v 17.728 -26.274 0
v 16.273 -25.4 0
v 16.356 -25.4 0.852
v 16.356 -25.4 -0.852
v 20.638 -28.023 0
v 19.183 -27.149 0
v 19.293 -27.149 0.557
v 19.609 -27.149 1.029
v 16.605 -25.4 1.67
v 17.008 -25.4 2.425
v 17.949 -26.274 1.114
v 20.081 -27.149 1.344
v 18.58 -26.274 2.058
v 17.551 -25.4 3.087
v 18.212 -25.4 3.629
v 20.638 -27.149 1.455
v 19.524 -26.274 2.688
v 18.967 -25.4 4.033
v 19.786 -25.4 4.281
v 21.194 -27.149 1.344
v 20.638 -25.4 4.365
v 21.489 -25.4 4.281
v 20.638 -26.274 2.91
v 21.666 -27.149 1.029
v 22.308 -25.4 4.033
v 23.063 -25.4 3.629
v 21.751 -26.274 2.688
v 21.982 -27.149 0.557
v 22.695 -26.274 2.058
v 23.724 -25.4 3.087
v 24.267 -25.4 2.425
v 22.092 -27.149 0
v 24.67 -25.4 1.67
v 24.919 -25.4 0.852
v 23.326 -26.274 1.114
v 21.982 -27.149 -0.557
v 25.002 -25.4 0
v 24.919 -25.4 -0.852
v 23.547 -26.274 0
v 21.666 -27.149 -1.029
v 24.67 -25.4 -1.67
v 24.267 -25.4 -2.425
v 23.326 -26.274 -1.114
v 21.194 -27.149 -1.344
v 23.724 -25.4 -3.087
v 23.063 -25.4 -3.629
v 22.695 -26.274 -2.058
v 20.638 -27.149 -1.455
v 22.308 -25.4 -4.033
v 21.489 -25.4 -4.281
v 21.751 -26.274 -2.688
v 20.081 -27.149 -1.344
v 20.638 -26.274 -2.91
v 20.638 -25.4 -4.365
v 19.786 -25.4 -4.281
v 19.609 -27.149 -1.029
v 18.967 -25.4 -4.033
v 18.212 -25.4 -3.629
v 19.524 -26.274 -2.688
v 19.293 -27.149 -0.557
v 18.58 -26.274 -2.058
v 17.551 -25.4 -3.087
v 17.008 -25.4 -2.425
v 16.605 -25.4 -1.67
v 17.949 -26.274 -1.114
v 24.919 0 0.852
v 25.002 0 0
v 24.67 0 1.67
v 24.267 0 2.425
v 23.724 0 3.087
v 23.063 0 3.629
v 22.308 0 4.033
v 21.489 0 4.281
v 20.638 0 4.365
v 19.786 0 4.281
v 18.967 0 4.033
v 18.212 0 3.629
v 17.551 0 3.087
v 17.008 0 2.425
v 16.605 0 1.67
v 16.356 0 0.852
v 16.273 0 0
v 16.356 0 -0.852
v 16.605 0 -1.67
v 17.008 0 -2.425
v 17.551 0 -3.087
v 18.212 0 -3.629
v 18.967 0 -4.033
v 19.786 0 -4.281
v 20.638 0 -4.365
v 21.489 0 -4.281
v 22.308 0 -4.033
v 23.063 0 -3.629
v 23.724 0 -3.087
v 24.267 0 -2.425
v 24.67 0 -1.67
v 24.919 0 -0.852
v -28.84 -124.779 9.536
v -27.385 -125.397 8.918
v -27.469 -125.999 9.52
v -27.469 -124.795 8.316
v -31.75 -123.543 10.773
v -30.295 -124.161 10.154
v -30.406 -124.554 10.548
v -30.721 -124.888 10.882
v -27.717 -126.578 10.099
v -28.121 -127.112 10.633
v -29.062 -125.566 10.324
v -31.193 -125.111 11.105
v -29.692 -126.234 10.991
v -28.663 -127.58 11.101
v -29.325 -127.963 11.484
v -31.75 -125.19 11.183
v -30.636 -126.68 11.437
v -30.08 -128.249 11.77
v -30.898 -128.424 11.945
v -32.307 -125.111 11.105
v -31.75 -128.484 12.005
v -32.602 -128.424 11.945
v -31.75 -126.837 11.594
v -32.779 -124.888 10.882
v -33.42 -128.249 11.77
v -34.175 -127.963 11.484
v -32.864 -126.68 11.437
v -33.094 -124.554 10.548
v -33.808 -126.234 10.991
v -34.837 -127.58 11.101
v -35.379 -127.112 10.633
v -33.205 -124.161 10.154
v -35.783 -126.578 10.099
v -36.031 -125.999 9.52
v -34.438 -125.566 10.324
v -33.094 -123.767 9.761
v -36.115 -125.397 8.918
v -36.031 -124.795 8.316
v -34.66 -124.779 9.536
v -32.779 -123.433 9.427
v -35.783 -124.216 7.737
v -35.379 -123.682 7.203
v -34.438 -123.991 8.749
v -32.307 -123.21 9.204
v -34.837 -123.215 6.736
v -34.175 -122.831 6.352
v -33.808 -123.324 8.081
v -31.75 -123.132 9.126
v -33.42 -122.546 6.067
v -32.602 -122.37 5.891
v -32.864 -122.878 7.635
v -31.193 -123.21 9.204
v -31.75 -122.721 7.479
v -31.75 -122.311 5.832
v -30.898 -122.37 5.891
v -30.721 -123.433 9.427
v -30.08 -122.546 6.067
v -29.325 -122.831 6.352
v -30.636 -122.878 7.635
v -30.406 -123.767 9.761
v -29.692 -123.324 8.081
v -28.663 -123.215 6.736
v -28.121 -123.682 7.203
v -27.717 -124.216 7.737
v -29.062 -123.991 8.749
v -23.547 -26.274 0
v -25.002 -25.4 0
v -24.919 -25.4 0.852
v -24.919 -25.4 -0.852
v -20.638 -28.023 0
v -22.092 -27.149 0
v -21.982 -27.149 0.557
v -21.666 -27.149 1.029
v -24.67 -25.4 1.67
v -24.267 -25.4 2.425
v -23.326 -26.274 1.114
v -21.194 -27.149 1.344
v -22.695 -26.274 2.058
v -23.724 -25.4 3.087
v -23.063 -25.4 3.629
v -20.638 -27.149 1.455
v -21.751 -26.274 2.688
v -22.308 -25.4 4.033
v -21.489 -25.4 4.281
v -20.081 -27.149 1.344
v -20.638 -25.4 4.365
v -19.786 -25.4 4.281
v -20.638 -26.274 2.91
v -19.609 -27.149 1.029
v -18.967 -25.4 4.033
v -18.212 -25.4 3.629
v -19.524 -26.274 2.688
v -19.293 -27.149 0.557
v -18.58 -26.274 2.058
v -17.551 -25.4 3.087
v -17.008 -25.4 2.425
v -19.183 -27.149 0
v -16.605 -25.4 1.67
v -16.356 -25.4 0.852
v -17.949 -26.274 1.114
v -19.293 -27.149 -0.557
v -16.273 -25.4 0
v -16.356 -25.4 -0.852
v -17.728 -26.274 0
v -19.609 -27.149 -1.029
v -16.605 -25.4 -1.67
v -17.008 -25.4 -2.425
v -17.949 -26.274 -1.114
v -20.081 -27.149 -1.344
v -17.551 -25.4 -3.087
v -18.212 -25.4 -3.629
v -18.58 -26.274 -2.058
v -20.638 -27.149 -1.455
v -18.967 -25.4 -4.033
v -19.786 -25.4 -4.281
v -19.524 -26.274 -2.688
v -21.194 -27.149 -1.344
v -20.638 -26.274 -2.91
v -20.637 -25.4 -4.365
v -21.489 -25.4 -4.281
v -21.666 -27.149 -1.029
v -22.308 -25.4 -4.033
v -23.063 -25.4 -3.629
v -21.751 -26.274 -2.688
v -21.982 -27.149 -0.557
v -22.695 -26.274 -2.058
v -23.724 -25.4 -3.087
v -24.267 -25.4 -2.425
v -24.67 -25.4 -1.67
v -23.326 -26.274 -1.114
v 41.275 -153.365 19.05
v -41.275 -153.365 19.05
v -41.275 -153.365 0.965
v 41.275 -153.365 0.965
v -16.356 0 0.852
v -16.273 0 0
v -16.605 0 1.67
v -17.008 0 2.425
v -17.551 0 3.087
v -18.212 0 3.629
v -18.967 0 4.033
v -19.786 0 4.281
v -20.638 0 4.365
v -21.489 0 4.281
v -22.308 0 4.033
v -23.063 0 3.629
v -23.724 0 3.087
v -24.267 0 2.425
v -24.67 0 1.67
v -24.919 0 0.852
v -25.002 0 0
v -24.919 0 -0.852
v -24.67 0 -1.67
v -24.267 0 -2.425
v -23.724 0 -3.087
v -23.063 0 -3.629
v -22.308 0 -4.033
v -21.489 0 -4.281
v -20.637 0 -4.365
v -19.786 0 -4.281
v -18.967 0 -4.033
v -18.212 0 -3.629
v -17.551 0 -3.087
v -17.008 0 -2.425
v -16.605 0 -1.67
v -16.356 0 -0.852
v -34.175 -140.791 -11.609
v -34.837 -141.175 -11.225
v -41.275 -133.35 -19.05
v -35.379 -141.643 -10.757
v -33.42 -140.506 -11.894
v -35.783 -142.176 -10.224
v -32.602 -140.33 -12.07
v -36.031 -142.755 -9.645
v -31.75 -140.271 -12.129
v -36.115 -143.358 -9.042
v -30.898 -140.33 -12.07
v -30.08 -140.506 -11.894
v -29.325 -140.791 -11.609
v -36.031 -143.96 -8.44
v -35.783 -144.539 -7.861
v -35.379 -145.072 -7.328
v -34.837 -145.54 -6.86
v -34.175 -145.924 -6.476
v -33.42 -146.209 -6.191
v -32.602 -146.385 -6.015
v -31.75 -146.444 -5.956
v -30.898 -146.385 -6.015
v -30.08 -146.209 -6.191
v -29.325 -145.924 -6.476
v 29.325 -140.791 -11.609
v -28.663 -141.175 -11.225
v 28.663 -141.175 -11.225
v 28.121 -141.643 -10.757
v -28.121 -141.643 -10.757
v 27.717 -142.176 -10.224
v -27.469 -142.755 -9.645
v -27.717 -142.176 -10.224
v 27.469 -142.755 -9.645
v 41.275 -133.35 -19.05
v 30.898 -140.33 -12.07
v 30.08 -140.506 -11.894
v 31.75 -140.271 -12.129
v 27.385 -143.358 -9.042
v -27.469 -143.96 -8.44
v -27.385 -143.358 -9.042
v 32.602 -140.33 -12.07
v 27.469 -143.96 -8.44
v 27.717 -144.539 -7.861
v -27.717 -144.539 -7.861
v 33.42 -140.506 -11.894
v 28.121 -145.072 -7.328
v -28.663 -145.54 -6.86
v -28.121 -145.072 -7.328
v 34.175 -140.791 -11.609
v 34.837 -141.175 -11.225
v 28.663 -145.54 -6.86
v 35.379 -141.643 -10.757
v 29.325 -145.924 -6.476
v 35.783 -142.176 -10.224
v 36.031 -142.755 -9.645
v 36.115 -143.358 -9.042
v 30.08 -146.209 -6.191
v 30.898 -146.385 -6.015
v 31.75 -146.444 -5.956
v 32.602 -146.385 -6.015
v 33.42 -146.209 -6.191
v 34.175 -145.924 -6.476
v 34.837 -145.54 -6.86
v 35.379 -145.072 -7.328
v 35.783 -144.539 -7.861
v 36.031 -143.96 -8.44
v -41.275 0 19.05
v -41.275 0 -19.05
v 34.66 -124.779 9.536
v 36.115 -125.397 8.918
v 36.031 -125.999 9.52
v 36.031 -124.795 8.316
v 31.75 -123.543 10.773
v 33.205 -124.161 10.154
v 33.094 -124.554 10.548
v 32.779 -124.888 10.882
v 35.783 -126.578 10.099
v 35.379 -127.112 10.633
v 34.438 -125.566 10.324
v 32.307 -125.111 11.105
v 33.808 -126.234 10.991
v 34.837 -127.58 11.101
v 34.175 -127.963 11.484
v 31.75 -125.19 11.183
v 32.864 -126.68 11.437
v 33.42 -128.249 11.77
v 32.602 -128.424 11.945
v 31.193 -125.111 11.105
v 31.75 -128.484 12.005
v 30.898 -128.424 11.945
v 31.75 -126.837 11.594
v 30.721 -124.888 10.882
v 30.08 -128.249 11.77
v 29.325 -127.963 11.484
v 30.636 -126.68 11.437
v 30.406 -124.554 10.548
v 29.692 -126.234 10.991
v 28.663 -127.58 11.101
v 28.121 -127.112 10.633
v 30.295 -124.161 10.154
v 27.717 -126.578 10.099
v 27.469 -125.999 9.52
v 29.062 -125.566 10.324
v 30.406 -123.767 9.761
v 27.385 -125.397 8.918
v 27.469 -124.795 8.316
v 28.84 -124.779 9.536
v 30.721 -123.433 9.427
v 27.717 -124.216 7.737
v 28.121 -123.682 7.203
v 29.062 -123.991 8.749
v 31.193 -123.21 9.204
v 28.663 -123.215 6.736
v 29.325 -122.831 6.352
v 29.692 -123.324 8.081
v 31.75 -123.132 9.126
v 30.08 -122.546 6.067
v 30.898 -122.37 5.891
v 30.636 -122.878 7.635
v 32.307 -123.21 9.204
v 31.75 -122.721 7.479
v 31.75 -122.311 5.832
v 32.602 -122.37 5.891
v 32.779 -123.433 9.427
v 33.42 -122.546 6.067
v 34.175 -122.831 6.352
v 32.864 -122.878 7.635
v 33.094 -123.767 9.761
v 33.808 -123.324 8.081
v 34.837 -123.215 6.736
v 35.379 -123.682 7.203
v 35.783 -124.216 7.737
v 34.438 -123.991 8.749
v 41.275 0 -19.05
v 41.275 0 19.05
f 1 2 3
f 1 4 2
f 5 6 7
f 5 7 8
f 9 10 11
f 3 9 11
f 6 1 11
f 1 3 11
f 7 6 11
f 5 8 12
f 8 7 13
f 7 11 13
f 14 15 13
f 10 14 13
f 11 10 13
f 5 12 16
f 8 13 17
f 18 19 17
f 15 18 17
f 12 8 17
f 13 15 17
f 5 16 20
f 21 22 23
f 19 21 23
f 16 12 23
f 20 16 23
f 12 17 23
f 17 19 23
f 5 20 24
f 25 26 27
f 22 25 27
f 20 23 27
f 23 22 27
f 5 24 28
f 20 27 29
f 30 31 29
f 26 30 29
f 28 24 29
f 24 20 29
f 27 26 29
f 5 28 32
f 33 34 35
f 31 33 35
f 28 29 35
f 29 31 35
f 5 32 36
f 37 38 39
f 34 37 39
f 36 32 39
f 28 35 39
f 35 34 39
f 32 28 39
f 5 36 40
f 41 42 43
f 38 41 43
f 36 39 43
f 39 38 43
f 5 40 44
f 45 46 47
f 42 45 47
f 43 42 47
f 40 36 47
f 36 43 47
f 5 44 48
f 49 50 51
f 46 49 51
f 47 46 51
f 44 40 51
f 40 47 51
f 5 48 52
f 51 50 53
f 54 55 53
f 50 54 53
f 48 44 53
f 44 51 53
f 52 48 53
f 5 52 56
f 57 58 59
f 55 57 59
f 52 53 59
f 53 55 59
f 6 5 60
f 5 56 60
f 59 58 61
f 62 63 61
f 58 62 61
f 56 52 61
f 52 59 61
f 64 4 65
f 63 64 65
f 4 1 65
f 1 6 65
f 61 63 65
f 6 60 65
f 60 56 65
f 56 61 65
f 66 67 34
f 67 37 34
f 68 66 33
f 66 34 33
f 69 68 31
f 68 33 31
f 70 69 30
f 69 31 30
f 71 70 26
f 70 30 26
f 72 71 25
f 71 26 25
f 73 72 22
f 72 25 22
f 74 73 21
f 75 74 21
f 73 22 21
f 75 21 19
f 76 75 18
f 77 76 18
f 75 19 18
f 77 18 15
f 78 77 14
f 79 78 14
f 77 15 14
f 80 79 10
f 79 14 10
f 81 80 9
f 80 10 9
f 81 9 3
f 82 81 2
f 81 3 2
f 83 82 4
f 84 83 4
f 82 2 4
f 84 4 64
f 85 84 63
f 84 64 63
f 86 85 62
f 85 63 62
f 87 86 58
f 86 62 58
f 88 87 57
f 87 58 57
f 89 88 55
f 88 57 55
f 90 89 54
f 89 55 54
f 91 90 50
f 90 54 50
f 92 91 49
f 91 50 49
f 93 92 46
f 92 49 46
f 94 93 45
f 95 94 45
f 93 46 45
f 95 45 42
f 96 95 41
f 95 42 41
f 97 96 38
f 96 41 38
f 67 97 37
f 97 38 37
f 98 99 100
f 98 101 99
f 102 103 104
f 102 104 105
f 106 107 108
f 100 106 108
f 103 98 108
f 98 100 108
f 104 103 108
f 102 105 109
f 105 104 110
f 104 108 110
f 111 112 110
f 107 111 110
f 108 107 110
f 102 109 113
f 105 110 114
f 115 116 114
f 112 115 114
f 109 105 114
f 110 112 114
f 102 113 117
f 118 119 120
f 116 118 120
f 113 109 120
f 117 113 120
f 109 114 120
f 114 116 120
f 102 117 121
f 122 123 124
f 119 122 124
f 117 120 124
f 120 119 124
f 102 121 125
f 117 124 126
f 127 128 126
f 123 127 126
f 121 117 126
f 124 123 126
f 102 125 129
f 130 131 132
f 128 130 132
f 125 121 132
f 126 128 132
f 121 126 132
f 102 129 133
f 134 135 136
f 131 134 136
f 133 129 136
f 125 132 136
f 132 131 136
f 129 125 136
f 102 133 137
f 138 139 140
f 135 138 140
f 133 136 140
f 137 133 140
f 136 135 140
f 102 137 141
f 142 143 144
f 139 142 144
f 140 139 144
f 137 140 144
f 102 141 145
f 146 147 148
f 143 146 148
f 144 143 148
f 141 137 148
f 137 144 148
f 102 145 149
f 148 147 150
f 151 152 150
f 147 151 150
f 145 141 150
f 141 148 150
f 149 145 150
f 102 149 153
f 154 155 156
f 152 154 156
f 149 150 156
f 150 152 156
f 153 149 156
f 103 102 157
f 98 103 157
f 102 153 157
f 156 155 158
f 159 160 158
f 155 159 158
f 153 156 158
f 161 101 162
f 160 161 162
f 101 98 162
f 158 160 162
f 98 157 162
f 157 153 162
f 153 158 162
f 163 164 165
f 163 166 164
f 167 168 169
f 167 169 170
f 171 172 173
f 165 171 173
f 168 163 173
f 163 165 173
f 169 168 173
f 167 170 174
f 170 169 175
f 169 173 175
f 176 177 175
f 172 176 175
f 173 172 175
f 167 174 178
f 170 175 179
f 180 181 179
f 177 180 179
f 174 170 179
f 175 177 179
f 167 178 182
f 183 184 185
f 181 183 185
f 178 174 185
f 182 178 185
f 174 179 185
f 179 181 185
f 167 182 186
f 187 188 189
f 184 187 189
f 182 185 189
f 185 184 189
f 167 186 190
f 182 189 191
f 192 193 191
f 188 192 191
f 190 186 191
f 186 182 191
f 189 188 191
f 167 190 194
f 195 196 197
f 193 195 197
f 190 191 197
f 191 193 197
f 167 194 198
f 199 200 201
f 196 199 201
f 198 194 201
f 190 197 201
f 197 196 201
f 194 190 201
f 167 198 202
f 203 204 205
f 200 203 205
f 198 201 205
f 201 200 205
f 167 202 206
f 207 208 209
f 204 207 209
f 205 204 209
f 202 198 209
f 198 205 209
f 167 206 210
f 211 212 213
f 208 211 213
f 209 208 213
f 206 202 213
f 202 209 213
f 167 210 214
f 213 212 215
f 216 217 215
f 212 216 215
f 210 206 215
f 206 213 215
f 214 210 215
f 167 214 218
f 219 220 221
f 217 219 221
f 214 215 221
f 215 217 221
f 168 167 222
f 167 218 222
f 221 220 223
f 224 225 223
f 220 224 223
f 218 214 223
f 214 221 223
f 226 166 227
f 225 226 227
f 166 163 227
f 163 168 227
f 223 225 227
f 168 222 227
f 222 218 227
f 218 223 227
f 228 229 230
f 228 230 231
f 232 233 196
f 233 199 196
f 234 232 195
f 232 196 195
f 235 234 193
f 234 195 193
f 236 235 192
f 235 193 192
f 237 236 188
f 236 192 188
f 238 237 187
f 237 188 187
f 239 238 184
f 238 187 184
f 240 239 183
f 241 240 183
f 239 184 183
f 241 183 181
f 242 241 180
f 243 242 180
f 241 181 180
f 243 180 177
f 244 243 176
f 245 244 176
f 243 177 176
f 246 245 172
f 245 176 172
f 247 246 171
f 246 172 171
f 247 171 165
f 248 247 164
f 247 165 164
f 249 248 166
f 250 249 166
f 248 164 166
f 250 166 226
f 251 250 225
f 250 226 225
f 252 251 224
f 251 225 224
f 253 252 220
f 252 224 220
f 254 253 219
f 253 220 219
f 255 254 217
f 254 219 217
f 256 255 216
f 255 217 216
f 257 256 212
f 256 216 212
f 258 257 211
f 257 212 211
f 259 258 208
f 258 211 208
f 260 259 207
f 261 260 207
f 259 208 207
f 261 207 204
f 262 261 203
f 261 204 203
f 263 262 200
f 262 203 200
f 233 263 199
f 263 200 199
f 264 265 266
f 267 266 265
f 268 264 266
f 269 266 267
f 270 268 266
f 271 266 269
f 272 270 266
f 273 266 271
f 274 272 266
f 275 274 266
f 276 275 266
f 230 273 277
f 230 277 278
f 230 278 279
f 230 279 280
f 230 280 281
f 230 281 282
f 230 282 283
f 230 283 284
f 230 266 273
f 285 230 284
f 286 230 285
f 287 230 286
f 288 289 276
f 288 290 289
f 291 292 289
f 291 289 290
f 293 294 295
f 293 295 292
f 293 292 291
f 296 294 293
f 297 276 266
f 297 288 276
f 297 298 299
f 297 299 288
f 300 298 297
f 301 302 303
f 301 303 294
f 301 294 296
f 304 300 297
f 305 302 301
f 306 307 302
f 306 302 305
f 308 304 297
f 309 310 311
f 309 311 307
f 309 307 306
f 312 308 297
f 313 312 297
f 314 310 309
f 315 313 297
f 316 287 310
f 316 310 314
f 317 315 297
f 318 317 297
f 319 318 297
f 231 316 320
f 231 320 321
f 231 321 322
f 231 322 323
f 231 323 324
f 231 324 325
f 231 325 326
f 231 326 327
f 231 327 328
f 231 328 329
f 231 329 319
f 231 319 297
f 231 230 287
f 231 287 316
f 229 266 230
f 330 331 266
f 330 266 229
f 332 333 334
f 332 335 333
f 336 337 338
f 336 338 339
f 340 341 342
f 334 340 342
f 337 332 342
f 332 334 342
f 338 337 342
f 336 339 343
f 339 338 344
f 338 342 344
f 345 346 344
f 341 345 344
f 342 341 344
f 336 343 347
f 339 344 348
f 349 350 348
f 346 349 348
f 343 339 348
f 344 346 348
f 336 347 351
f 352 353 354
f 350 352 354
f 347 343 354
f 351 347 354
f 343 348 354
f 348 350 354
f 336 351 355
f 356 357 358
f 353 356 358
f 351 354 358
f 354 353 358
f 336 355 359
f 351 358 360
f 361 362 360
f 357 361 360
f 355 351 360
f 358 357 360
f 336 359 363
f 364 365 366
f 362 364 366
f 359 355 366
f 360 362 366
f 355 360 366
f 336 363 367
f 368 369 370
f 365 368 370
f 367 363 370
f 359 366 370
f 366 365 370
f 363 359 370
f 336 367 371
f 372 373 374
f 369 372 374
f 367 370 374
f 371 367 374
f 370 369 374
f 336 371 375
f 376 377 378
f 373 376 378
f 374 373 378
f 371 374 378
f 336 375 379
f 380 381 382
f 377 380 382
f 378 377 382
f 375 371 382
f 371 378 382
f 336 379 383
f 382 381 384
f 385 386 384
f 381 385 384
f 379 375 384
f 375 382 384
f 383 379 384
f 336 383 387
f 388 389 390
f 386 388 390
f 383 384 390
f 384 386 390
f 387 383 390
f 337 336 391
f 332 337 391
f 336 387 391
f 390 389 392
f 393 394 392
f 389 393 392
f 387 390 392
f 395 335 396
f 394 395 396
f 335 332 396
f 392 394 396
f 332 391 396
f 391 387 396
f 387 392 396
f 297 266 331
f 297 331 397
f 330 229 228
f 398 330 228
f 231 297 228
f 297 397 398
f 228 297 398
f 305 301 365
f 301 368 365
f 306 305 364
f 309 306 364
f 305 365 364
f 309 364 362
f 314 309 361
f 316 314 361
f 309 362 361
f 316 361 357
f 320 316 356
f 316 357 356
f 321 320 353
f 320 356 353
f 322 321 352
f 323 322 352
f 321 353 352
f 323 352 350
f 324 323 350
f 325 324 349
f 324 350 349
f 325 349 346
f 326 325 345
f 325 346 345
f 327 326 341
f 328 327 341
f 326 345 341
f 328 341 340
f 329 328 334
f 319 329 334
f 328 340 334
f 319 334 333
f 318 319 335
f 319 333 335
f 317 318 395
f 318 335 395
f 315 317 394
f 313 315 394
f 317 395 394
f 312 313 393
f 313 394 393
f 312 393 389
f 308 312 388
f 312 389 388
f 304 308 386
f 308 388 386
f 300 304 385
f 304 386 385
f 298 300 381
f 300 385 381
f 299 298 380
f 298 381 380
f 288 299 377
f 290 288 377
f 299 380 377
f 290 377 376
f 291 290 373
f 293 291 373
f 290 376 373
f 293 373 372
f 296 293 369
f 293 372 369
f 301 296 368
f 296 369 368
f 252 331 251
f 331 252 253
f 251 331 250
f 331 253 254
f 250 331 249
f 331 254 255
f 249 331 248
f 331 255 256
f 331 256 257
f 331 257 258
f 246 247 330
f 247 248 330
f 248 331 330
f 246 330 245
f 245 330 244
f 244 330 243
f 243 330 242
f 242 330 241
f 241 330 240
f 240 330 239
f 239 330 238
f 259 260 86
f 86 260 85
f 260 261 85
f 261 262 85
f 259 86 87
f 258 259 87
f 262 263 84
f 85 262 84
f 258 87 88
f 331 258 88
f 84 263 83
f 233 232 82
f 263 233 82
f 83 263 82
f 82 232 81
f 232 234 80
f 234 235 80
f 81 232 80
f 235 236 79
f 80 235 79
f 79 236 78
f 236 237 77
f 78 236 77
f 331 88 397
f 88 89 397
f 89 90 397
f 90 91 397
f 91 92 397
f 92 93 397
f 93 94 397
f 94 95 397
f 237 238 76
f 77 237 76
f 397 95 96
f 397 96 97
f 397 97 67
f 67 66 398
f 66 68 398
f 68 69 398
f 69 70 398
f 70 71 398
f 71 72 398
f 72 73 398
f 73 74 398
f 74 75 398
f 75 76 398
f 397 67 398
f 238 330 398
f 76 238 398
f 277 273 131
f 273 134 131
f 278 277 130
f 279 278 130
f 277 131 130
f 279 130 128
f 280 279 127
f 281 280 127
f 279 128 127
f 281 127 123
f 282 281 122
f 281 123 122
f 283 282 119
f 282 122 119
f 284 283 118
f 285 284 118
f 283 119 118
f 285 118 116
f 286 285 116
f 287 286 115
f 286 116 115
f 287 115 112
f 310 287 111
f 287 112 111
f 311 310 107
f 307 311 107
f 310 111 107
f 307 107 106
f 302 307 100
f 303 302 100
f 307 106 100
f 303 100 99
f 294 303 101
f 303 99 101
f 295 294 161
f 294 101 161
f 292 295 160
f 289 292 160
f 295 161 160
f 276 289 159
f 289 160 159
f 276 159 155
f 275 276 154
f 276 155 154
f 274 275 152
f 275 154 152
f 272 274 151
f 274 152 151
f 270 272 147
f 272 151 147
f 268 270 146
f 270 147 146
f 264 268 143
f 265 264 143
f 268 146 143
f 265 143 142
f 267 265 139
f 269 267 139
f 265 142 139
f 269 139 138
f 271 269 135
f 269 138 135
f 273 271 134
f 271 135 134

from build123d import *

# Parameters (mm, degrees)
F0_W           = 82.55
F0_H           = 38.1
F1_DEPTH       = 153.3652
F2_SIZE2       = 20.0152
F2_SIZE        = 20.0152
F5_D           = 8.72998
F5_DEPTH       = 25.4
F5_TIP         = 2.6227505934
F5_ON_F4_D     = 8.72998
F5_ON_F4_DEPTH = 25.4
F5_ON_F4_TIP   = 2.6227505934


with BuildPart() as f1:
    # F0 (on Front) → F1 (new body)
    with BuildSketch(Plane.XZ):
        Rectangle(F0_W, F0_H)
    extrude(amount=F1_DEPTH)

    # F2
    f2_edges = [f1.edges().sort_by_distance(p)[0] for p in [
        (0, -153.3652, -19.05),
    ]]
    chamfer(f2_edges, length=F2_SIZE, length2=F2_SIZE2)

    # F5
    with Locations(Plane(origin=(0, -76.2, -76.2), x_dir=(1, 0, 0), z_dir=(0, -0.7071067812, -0.7071067812))):
        with Locations((-31.75, 94.9751887364), (31.75, 94.9751887364)):
            Hole(F5_D / 2, depth=F5_DEPTH)
            with Locations((0, 0, -(F5_DEPTH + F5_TIP / 2))):  # 118° drill point
                Cone(0, F5_D / 2, F5_TIP, mode=Mode.SUBTRACT)

    # F5 on F4
    with Locations(Plane(origin=(0, 0, 0), x_dir=(-1, 0, 0), z_dir=(0, 1, 0))):
        with Locations((-20.6375, 0), (20.6375, 0)):
            Hole(F5_ON_F4_D / 2, depth=F5_ON_F4_DEPTH)
            with Locations((0, 0, -(F5_ON_F4_DEPTH + F5_ON_F4_TIP / 2))):  # 118° drill point
                Cone(0, F5_ON_F4_D / 2, F5_ON_F4_TIP, mode=Mode.SUBTRACT)


solid = f1.part
